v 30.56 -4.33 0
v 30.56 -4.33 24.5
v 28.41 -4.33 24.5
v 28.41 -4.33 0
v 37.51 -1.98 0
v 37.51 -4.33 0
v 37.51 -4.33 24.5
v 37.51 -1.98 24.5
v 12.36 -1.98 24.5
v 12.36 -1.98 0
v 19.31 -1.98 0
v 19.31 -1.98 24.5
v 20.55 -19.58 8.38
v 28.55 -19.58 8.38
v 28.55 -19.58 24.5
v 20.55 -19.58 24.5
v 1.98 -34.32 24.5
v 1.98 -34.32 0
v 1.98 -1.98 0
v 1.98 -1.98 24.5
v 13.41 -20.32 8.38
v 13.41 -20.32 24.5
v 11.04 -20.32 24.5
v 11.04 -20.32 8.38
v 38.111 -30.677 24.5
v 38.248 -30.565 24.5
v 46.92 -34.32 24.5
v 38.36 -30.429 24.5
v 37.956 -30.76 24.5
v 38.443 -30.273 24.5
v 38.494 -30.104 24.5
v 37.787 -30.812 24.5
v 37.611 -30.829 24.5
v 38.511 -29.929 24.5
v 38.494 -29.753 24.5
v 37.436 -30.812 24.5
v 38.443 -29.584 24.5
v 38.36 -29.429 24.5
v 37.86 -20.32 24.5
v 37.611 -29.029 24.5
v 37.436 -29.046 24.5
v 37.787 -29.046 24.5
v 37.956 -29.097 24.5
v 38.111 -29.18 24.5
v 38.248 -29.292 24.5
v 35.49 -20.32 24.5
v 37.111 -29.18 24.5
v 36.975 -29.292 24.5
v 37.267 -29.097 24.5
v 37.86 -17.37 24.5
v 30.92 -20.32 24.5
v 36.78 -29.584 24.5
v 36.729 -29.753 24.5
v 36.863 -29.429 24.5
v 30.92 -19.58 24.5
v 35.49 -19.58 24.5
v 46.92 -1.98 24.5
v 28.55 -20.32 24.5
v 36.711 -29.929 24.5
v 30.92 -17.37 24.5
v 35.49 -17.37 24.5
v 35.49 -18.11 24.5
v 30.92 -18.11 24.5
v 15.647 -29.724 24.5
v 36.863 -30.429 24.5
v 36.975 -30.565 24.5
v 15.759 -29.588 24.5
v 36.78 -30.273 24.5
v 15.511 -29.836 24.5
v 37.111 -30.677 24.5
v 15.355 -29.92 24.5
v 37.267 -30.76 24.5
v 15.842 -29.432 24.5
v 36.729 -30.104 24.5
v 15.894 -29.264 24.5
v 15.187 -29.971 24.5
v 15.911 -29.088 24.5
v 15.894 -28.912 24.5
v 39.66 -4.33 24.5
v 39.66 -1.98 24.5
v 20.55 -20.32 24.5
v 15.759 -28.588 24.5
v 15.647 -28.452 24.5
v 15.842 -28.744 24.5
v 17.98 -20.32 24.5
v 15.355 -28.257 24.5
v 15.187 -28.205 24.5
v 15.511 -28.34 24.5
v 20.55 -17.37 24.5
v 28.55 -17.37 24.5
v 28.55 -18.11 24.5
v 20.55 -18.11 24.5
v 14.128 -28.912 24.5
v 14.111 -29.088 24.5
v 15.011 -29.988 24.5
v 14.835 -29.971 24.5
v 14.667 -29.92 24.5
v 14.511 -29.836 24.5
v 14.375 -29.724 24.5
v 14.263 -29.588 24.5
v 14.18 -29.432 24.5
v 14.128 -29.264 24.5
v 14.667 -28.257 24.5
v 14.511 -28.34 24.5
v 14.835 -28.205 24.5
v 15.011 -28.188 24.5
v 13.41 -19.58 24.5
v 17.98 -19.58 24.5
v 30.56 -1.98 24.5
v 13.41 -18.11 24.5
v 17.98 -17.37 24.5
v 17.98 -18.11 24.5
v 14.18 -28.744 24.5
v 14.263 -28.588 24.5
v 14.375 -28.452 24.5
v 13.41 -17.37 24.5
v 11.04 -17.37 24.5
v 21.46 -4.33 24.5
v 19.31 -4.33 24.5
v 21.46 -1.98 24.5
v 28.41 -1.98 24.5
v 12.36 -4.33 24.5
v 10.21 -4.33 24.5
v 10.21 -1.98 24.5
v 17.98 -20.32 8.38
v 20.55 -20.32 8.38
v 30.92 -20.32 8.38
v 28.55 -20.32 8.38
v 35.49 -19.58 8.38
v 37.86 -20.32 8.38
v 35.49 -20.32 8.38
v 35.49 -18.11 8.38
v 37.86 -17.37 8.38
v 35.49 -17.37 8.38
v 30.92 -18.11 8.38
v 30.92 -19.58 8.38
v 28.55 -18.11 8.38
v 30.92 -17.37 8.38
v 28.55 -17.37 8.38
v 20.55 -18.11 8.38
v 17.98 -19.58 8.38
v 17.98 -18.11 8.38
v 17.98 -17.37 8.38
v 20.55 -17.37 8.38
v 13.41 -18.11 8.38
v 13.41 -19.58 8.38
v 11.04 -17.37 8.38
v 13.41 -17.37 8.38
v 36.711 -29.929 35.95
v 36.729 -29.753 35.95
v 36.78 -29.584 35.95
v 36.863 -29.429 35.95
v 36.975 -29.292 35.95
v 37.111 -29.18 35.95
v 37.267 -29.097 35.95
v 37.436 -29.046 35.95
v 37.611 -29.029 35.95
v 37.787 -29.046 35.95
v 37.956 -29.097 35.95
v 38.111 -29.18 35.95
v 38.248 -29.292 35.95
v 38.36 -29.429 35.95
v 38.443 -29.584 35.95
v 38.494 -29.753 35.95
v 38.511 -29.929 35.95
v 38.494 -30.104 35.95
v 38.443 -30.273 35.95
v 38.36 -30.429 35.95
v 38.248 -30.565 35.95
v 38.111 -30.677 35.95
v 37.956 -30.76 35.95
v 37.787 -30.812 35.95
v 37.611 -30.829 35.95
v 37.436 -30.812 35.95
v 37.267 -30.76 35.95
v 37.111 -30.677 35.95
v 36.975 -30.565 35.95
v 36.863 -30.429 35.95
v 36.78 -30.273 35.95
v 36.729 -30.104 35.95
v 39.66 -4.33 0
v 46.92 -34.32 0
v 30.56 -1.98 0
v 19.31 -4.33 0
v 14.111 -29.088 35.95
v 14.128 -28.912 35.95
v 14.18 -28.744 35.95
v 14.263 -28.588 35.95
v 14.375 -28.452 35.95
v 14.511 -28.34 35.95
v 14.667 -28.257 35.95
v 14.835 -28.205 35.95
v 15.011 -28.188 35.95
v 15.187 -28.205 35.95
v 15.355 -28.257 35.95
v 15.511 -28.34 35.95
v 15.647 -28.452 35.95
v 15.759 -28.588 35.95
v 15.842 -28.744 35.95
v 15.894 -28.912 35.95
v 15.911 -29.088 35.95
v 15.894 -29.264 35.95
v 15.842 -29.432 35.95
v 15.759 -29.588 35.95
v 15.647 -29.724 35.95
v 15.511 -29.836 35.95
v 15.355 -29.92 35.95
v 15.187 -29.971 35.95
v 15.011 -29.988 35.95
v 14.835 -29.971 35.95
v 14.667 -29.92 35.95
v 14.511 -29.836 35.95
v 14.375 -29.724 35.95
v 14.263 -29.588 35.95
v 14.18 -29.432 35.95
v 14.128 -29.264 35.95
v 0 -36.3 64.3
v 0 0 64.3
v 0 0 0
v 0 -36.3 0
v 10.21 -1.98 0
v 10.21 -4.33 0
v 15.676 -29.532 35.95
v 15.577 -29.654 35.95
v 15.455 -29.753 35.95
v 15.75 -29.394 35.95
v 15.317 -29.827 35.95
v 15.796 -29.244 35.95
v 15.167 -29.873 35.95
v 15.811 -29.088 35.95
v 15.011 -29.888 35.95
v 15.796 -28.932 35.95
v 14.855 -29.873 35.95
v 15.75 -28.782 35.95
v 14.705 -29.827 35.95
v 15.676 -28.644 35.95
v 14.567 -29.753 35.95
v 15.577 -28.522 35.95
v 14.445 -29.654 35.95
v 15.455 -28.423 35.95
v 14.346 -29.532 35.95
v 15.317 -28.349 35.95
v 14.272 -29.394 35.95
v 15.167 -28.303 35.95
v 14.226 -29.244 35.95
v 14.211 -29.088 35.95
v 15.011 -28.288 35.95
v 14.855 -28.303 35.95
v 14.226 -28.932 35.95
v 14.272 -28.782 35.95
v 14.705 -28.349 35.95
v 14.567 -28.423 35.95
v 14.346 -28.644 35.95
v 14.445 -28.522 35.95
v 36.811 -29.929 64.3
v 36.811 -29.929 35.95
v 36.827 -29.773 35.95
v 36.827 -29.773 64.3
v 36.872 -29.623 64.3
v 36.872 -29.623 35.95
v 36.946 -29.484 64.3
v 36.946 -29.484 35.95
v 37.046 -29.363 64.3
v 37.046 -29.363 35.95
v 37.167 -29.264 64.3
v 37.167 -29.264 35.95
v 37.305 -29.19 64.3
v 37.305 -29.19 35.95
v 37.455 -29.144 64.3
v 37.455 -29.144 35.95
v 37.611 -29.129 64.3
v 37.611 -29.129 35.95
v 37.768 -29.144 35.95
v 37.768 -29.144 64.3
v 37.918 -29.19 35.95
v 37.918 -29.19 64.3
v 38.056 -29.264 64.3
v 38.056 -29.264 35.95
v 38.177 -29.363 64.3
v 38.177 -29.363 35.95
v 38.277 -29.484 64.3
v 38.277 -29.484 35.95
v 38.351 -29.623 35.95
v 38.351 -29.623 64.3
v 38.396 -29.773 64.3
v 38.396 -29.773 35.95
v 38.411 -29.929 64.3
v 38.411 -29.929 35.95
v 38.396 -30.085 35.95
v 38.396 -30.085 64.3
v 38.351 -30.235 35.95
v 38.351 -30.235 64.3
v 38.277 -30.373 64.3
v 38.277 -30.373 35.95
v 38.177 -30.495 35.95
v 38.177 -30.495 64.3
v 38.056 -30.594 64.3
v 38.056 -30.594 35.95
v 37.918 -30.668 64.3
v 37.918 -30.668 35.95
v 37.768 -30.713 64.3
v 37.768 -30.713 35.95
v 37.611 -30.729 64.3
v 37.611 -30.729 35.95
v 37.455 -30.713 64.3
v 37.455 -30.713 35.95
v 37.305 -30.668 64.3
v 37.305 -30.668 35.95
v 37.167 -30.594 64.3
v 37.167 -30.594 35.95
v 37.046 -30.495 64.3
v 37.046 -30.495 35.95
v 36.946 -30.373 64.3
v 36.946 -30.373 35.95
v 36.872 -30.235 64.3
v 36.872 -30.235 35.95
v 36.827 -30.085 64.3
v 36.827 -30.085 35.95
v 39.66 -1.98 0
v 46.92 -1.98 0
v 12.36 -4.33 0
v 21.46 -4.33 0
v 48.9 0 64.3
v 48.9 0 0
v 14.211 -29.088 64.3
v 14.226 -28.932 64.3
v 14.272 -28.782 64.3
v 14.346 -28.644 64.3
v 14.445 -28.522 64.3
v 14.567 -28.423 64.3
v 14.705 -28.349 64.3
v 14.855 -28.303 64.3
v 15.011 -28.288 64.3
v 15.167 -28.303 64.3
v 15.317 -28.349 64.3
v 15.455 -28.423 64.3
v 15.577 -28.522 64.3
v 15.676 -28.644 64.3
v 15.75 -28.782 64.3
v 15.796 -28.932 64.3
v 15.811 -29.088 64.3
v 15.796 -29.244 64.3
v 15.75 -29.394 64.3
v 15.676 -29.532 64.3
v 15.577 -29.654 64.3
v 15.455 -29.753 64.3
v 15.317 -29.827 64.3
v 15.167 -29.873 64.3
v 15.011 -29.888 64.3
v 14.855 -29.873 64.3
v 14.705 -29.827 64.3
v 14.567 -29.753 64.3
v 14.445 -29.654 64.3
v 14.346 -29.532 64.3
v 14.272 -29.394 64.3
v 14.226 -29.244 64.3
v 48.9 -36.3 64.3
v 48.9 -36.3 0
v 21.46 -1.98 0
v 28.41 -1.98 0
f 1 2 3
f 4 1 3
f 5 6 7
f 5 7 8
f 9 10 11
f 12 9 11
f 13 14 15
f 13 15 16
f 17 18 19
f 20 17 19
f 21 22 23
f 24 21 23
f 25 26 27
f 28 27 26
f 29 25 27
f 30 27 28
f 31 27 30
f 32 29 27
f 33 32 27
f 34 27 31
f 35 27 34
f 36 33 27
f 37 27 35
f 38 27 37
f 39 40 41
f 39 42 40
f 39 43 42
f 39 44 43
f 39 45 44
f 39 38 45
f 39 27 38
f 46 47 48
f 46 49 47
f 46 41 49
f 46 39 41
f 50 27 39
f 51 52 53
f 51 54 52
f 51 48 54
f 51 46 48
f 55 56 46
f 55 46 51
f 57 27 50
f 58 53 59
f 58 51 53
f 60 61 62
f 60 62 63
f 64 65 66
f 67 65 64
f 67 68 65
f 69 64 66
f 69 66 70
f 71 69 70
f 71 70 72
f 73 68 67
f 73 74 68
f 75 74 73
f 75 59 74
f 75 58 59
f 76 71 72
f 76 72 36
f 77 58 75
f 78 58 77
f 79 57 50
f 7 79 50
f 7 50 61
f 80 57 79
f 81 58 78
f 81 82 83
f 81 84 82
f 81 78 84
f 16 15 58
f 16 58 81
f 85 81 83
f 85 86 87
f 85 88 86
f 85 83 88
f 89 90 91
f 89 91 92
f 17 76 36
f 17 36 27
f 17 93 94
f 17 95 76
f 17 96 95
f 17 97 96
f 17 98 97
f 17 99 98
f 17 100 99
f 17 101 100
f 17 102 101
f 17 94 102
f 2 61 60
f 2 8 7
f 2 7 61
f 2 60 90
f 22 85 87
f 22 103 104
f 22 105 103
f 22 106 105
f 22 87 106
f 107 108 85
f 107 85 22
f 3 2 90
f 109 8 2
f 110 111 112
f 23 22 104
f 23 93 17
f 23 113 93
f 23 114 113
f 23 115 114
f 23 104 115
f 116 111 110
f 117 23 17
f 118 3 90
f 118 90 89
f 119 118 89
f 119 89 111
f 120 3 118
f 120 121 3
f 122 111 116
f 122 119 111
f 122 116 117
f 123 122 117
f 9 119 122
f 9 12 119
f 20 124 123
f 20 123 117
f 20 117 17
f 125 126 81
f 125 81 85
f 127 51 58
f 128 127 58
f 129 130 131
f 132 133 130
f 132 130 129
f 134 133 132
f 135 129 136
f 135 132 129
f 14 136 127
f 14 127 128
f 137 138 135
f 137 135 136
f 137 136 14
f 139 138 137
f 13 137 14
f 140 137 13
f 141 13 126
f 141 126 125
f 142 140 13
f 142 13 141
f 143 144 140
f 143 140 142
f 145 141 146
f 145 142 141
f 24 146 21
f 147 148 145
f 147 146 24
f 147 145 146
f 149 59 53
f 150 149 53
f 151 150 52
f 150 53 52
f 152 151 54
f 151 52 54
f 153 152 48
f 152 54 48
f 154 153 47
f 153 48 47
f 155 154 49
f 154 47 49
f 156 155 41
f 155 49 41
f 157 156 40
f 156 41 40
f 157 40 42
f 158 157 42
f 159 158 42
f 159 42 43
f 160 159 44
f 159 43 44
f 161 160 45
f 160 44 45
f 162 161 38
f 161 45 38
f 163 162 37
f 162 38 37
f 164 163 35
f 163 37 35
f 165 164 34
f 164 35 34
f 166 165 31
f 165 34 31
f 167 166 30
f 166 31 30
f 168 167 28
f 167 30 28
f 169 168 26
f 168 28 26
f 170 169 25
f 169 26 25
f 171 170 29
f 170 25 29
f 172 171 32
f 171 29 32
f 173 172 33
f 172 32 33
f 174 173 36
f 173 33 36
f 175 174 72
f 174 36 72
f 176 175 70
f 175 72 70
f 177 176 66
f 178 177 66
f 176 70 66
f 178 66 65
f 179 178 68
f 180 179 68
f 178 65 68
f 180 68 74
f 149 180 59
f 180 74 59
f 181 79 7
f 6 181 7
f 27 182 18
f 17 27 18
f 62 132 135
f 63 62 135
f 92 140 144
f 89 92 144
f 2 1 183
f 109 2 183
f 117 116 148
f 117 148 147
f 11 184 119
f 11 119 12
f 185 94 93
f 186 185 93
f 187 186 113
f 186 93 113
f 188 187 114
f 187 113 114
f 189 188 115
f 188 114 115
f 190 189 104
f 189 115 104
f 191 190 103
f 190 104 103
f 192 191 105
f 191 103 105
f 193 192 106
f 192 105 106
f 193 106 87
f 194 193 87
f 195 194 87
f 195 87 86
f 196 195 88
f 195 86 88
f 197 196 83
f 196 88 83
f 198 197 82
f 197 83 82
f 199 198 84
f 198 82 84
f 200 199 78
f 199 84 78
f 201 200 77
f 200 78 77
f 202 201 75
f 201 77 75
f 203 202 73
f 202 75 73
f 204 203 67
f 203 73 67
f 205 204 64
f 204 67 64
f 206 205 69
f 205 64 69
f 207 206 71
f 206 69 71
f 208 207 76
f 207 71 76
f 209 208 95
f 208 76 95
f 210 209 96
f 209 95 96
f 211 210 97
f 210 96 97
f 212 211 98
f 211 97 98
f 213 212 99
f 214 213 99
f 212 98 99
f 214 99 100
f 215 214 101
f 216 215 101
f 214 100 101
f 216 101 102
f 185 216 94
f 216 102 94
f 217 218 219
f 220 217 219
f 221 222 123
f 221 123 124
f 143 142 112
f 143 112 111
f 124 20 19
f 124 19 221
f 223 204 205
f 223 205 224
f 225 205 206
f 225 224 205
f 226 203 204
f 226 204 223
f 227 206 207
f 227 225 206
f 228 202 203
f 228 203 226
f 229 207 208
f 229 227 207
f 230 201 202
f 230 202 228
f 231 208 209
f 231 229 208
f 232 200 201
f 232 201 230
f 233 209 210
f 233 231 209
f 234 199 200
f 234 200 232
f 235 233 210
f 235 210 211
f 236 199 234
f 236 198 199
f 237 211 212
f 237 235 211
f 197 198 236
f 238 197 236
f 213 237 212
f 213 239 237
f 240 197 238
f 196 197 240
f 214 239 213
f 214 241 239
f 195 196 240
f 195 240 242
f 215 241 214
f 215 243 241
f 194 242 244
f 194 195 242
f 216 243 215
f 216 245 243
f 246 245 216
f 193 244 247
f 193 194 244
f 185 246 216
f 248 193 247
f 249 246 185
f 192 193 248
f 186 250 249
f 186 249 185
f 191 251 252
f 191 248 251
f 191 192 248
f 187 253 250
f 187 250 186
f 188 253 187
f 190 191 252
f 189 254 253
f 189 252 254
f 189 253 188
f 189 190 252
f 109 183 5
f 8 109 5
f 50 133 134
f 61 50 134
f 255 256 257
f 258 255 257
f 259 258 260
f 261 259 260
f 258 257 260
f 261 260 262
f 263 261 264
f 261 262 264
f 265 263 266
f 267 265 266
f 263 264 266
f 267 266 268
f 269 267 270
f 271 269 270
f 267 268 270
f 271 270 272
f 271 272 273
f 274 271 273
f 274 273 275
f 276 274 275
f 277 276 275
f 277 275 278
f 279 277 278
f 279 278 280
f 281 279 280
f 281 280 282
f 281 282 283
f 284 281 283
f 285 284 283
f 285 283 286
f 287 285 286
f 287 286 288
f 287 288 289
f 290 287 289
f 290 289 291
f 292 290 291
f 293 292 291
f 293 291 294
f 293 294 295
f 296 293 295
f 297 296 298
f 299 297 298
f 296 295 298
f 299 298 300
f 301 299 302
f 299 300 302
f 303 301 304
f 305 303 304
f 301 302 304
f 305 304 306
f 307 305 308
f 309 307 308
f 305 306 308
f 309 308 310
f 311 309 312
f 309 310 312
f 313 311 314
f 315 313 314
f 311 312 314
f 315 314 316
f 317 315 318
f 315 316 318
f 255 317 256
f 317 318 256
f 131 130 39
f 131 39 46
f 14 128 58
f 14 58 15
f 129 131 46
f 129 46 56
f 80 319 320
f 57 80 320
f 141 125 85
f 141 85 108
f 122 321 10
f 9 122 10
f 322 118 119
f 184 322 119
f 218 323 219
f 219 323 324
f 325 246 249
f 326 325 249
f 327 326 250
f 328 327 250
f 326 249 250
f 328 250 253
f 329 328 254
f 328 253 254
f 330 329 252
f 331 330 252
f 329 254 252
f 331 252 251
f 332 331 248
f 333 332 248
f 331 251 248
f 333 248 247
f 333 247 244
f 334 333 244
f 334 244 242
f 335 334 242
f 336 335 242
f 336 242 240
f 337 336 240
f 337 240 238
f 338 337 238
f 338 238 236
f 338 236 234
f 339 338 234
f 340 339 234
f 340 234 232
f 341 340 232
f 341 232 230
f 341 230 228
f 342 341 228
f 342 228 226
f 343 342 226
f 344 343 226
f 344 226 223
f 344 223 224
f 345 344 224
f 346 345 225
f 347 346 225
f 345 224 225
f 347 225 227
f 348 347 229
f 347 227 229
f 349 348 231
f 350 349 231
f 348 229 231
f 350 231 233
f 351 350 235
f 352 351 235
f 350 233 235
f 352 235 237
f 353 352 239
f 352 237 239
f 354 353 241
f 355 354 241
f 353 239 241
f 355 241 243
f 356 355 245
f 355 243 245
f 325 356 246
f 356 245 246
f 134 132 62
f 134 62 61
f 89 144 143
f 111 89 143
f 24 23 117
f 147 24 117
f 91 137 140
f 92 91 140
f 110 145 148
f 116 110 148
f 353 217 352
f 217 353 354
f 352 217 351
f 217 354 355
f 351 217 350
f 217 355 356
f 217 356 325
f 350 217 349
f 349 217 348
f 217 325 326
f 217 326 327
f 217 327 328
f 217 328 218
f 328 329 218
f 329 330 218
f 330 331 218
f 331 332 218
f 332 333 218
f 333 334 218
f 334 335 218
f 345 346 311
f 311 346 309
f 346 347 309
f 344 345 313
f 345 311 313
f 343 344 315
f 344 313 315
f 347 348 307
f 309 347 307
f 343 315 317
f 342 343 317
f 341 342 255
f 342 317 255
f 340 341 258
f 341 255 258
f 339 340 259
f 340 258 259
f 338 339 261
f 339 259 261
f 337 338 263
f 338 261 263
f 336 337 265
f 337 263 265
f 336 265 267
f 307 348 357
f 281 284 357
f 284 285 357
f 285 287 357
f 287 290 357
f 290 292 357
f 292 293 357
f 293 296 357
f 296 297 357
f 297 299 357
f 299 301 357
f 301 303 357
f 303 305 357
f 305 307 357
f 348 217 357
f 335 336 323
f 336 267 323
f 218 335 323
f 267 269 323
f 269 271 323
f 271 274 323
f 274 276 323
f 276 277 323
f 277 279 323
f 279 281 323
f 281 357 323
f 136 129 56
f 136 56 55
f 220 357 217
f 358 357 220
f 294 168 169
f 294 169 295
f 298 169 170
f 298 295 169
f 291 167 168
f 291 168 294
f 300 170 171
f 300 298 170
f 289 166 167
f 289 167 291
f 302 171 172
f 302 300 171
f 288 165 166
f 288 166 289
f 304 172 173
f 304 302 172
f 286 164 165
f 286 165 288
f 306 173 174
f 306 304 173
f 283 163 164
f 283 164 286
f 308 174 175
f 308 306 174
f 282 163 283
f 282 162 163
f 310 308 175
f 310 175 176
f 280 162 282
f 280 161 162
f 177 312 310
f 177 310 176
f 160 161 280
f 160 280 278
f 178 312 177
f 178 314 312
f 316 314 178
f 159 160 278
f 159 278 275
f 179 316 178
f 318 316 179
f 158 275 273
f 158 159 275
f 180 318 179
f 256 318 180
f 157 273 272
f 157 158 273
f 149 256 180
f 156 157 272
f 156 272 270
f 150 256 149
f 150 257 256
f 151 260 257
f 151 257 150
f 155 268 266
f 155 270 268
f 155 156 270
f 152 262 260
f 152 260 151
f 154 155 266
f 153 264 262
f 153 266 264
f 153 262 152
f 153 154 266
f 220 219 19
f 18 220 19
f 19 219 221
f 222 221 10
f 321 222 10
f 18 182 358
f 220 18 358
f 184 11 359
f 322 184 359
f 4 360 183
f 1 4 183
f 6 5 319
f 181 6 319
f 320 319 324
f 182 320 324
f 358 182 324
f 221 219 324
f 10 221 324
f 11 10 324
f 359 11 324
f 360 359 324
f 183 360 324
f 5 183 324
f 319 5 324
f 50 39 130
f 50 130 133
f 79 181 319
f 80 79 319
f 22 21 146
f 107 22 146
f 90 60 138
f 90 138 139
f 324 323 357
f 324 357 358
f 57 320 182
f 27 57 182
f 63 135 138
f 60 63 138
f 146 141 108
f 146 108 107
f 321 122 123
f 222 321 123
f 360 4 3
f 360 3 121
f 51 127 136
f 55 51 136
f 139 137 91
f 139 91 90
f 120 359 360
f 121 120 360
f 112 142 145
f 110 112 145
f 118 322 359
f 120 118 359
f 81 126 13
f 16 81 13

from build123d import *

# Parameters (mm, degrees)
SKETCH1_W           = 48.9
SKETCH1_H           = 36.3
BOSS_EXTRUDE1_DEPTH = 26
CUT_EXTRUDE1_DEPTH  = 24.5
SKETCH4_W           = 2.15
SKETCH4_H           = 2.35
BOSS_EXTRUDE3_DEPTH = 24.5
SKETCH5_W           = 26.82
SKETCH5_H           = 2.95
BOSS_EXTRUDE4_DEPTH = 16.12
SKETCH6_W           = 4.57
SKETCH6_H           = 0.74
SKETCH6_W_2         = 8
CUT_EXTRUDE2_DEPTH  = 16.12
SKETCH7_W           = 38.3
SKETCH7_H           = 36.3
BOSS_EXTRUDE5_DEPTH = 48.9
SKETCH8_R           = 0.9
CUT_EXTRUDE3_DEPTH  = 11.45
SKETCH9_R           = 0.8
CUT_EXTRUDE4_DEPTH  = 71.719887585


with BuildPart() as part:
    # Sketch1 → Boss-Extrude1 (new body)
    with BuildSketch(Plane.XY):
        with Locations((24.45, -18.15)):
            Rectangle(SKETCH1_W, SKETCH1_H)
    extrude(amount=BOSS_EXTRUDE1_DEPTH)

    # Sketch3 → Cut-Extrude1 (cut)
    with BuildSketch(Plane(origin=(0, 0, 0), x_dir=(-1, 0, 0), z_dir=(0, 0, -1))):
        Polygon((-24.45, -1.98), (-46.92, -1.98), (-46.92, -34.32), (-1.98, -34.32), (-1.98, -1.98), align=None)
    extrude(amount=-CUT_EXTRUDE1_DEPTH, mode=Mode.SUBTRACT)

    # Sketch4 → Boss-Extrude3 (add)
    with BuildSketch(Plane(origin=(0, 0, 24.5), x_dir=(-1, 0, 0), z_dir=(0, 0, -1))):
        with Locations((-38.585, -3.155)):
            Rectangle(SKETCH4_W, SKETCH4_H)
        with Locations((-29.485, -3.155)):
            Rectangle(SKETCH4_W, SKETCH4_H)
        with Locations((-20.385, -3.155)):
            Rectangle(SKETCH4_W, SKETCH4_H)
        with Locations((-11.285, -3.155)):
            Rectangle(SKETCH4_W, SKETCH4_H)
    extrude(amount=BOSS_EXTRUDE3_DEPTH)

    # Sketch5 → Boss-Extrude4 (add)
    with BuildSketch(Plane(origin=(0, 0, 24.5), x_dir=(-1, 0, 0), z_dir=(0, 0, -1))):
        with Locations((-24.45, -18.845)):
            Rectangle(SKETCH5_W, SKETCH5_H)
    extrude(amount=BOSS_EXTRUDE4_DEPTH)

    # Sketch6 → Cut-Extrude2 (cut)
    with BuildSketch(Plane(origin=(0, 0, 8.38), x_dir=(-1, 0, 0), z_dir=(0, 0, -1))):
        with Locations((-33.205, -19.95)):
            Rectangle(SKETCH6_W, SKETCH6_H)
        with Locations((-24.55, -19.95)):
            Rectangle(SKETCH6_W_2, SKETCH6_H)
        with Locations((-15.695, -19.95)):
            Rectangle(SKETCH6_W, SKETCH6_H)
        with Locations((-15.695, -17.74)):
            Rectangle(SKETCH6_W, SKETCH6_H)
        with Locations((-24.55, -17.74)):
            Rectangle(SKETCH6_W_2, SKETCH6_H)
        with Locations((-33.205, -17.74)):
            Rectangle(SKETCH6_W, SKETCH6_H)
    extrude(amount=-CUT_EXTRUDE2_DEPTH, mode=Mode.SUBTRACT)

    # Sketch7 → Boss-Extrude5 (add)
    with BuildSketch(Plane(origin=(48.9, 0, 0), x_dir=(0, 0, -1), z_dir=(1, 0, 0))):
        with Locations((-45.15, -18.15)):
            Rectangle(SKETCH7_W, SKETCH7_H)
    extrude(amount=-BOSS_EXTRUDE5_DEPTH)

    # Sketch8 → Cut-Extrude3 (cut)
    with BuildSketch(Plane(origin=(0, 0, 24.5), x_dir=(-1, 0, 0), z_dir=(0, 0, -1))):
        with Locations((-37.61143404, -29.928818747)):
            Circle(SKETCH8_R)
        with Locations((-15.010991749, -29.088008467)):
            Circle(SKETCH8_R)
    extrude(amount=-CUT_EXTRUDE3_DEPTH, mode=Mode.SUBTRACT)

    # Sketch9 → Cut-Extrude4 (cut, through all)
    with BuildSketch(Plane(origin=(0, 0, 35.95), x_dir=(-1, 0, 0), z_dir=(0, 0, -1))):
        with Locations((-37.61143404, -29.928818747)):
            Circle(SKETCH9_R)
        with Locations((-15.010991749, -29.088008467)):
            Circle(SKETCH9_R)
    extrude(amount=-CUT_EXTRUDE4_DEPTH, mode=Mode.SUBTRACT)


solid = part.part
